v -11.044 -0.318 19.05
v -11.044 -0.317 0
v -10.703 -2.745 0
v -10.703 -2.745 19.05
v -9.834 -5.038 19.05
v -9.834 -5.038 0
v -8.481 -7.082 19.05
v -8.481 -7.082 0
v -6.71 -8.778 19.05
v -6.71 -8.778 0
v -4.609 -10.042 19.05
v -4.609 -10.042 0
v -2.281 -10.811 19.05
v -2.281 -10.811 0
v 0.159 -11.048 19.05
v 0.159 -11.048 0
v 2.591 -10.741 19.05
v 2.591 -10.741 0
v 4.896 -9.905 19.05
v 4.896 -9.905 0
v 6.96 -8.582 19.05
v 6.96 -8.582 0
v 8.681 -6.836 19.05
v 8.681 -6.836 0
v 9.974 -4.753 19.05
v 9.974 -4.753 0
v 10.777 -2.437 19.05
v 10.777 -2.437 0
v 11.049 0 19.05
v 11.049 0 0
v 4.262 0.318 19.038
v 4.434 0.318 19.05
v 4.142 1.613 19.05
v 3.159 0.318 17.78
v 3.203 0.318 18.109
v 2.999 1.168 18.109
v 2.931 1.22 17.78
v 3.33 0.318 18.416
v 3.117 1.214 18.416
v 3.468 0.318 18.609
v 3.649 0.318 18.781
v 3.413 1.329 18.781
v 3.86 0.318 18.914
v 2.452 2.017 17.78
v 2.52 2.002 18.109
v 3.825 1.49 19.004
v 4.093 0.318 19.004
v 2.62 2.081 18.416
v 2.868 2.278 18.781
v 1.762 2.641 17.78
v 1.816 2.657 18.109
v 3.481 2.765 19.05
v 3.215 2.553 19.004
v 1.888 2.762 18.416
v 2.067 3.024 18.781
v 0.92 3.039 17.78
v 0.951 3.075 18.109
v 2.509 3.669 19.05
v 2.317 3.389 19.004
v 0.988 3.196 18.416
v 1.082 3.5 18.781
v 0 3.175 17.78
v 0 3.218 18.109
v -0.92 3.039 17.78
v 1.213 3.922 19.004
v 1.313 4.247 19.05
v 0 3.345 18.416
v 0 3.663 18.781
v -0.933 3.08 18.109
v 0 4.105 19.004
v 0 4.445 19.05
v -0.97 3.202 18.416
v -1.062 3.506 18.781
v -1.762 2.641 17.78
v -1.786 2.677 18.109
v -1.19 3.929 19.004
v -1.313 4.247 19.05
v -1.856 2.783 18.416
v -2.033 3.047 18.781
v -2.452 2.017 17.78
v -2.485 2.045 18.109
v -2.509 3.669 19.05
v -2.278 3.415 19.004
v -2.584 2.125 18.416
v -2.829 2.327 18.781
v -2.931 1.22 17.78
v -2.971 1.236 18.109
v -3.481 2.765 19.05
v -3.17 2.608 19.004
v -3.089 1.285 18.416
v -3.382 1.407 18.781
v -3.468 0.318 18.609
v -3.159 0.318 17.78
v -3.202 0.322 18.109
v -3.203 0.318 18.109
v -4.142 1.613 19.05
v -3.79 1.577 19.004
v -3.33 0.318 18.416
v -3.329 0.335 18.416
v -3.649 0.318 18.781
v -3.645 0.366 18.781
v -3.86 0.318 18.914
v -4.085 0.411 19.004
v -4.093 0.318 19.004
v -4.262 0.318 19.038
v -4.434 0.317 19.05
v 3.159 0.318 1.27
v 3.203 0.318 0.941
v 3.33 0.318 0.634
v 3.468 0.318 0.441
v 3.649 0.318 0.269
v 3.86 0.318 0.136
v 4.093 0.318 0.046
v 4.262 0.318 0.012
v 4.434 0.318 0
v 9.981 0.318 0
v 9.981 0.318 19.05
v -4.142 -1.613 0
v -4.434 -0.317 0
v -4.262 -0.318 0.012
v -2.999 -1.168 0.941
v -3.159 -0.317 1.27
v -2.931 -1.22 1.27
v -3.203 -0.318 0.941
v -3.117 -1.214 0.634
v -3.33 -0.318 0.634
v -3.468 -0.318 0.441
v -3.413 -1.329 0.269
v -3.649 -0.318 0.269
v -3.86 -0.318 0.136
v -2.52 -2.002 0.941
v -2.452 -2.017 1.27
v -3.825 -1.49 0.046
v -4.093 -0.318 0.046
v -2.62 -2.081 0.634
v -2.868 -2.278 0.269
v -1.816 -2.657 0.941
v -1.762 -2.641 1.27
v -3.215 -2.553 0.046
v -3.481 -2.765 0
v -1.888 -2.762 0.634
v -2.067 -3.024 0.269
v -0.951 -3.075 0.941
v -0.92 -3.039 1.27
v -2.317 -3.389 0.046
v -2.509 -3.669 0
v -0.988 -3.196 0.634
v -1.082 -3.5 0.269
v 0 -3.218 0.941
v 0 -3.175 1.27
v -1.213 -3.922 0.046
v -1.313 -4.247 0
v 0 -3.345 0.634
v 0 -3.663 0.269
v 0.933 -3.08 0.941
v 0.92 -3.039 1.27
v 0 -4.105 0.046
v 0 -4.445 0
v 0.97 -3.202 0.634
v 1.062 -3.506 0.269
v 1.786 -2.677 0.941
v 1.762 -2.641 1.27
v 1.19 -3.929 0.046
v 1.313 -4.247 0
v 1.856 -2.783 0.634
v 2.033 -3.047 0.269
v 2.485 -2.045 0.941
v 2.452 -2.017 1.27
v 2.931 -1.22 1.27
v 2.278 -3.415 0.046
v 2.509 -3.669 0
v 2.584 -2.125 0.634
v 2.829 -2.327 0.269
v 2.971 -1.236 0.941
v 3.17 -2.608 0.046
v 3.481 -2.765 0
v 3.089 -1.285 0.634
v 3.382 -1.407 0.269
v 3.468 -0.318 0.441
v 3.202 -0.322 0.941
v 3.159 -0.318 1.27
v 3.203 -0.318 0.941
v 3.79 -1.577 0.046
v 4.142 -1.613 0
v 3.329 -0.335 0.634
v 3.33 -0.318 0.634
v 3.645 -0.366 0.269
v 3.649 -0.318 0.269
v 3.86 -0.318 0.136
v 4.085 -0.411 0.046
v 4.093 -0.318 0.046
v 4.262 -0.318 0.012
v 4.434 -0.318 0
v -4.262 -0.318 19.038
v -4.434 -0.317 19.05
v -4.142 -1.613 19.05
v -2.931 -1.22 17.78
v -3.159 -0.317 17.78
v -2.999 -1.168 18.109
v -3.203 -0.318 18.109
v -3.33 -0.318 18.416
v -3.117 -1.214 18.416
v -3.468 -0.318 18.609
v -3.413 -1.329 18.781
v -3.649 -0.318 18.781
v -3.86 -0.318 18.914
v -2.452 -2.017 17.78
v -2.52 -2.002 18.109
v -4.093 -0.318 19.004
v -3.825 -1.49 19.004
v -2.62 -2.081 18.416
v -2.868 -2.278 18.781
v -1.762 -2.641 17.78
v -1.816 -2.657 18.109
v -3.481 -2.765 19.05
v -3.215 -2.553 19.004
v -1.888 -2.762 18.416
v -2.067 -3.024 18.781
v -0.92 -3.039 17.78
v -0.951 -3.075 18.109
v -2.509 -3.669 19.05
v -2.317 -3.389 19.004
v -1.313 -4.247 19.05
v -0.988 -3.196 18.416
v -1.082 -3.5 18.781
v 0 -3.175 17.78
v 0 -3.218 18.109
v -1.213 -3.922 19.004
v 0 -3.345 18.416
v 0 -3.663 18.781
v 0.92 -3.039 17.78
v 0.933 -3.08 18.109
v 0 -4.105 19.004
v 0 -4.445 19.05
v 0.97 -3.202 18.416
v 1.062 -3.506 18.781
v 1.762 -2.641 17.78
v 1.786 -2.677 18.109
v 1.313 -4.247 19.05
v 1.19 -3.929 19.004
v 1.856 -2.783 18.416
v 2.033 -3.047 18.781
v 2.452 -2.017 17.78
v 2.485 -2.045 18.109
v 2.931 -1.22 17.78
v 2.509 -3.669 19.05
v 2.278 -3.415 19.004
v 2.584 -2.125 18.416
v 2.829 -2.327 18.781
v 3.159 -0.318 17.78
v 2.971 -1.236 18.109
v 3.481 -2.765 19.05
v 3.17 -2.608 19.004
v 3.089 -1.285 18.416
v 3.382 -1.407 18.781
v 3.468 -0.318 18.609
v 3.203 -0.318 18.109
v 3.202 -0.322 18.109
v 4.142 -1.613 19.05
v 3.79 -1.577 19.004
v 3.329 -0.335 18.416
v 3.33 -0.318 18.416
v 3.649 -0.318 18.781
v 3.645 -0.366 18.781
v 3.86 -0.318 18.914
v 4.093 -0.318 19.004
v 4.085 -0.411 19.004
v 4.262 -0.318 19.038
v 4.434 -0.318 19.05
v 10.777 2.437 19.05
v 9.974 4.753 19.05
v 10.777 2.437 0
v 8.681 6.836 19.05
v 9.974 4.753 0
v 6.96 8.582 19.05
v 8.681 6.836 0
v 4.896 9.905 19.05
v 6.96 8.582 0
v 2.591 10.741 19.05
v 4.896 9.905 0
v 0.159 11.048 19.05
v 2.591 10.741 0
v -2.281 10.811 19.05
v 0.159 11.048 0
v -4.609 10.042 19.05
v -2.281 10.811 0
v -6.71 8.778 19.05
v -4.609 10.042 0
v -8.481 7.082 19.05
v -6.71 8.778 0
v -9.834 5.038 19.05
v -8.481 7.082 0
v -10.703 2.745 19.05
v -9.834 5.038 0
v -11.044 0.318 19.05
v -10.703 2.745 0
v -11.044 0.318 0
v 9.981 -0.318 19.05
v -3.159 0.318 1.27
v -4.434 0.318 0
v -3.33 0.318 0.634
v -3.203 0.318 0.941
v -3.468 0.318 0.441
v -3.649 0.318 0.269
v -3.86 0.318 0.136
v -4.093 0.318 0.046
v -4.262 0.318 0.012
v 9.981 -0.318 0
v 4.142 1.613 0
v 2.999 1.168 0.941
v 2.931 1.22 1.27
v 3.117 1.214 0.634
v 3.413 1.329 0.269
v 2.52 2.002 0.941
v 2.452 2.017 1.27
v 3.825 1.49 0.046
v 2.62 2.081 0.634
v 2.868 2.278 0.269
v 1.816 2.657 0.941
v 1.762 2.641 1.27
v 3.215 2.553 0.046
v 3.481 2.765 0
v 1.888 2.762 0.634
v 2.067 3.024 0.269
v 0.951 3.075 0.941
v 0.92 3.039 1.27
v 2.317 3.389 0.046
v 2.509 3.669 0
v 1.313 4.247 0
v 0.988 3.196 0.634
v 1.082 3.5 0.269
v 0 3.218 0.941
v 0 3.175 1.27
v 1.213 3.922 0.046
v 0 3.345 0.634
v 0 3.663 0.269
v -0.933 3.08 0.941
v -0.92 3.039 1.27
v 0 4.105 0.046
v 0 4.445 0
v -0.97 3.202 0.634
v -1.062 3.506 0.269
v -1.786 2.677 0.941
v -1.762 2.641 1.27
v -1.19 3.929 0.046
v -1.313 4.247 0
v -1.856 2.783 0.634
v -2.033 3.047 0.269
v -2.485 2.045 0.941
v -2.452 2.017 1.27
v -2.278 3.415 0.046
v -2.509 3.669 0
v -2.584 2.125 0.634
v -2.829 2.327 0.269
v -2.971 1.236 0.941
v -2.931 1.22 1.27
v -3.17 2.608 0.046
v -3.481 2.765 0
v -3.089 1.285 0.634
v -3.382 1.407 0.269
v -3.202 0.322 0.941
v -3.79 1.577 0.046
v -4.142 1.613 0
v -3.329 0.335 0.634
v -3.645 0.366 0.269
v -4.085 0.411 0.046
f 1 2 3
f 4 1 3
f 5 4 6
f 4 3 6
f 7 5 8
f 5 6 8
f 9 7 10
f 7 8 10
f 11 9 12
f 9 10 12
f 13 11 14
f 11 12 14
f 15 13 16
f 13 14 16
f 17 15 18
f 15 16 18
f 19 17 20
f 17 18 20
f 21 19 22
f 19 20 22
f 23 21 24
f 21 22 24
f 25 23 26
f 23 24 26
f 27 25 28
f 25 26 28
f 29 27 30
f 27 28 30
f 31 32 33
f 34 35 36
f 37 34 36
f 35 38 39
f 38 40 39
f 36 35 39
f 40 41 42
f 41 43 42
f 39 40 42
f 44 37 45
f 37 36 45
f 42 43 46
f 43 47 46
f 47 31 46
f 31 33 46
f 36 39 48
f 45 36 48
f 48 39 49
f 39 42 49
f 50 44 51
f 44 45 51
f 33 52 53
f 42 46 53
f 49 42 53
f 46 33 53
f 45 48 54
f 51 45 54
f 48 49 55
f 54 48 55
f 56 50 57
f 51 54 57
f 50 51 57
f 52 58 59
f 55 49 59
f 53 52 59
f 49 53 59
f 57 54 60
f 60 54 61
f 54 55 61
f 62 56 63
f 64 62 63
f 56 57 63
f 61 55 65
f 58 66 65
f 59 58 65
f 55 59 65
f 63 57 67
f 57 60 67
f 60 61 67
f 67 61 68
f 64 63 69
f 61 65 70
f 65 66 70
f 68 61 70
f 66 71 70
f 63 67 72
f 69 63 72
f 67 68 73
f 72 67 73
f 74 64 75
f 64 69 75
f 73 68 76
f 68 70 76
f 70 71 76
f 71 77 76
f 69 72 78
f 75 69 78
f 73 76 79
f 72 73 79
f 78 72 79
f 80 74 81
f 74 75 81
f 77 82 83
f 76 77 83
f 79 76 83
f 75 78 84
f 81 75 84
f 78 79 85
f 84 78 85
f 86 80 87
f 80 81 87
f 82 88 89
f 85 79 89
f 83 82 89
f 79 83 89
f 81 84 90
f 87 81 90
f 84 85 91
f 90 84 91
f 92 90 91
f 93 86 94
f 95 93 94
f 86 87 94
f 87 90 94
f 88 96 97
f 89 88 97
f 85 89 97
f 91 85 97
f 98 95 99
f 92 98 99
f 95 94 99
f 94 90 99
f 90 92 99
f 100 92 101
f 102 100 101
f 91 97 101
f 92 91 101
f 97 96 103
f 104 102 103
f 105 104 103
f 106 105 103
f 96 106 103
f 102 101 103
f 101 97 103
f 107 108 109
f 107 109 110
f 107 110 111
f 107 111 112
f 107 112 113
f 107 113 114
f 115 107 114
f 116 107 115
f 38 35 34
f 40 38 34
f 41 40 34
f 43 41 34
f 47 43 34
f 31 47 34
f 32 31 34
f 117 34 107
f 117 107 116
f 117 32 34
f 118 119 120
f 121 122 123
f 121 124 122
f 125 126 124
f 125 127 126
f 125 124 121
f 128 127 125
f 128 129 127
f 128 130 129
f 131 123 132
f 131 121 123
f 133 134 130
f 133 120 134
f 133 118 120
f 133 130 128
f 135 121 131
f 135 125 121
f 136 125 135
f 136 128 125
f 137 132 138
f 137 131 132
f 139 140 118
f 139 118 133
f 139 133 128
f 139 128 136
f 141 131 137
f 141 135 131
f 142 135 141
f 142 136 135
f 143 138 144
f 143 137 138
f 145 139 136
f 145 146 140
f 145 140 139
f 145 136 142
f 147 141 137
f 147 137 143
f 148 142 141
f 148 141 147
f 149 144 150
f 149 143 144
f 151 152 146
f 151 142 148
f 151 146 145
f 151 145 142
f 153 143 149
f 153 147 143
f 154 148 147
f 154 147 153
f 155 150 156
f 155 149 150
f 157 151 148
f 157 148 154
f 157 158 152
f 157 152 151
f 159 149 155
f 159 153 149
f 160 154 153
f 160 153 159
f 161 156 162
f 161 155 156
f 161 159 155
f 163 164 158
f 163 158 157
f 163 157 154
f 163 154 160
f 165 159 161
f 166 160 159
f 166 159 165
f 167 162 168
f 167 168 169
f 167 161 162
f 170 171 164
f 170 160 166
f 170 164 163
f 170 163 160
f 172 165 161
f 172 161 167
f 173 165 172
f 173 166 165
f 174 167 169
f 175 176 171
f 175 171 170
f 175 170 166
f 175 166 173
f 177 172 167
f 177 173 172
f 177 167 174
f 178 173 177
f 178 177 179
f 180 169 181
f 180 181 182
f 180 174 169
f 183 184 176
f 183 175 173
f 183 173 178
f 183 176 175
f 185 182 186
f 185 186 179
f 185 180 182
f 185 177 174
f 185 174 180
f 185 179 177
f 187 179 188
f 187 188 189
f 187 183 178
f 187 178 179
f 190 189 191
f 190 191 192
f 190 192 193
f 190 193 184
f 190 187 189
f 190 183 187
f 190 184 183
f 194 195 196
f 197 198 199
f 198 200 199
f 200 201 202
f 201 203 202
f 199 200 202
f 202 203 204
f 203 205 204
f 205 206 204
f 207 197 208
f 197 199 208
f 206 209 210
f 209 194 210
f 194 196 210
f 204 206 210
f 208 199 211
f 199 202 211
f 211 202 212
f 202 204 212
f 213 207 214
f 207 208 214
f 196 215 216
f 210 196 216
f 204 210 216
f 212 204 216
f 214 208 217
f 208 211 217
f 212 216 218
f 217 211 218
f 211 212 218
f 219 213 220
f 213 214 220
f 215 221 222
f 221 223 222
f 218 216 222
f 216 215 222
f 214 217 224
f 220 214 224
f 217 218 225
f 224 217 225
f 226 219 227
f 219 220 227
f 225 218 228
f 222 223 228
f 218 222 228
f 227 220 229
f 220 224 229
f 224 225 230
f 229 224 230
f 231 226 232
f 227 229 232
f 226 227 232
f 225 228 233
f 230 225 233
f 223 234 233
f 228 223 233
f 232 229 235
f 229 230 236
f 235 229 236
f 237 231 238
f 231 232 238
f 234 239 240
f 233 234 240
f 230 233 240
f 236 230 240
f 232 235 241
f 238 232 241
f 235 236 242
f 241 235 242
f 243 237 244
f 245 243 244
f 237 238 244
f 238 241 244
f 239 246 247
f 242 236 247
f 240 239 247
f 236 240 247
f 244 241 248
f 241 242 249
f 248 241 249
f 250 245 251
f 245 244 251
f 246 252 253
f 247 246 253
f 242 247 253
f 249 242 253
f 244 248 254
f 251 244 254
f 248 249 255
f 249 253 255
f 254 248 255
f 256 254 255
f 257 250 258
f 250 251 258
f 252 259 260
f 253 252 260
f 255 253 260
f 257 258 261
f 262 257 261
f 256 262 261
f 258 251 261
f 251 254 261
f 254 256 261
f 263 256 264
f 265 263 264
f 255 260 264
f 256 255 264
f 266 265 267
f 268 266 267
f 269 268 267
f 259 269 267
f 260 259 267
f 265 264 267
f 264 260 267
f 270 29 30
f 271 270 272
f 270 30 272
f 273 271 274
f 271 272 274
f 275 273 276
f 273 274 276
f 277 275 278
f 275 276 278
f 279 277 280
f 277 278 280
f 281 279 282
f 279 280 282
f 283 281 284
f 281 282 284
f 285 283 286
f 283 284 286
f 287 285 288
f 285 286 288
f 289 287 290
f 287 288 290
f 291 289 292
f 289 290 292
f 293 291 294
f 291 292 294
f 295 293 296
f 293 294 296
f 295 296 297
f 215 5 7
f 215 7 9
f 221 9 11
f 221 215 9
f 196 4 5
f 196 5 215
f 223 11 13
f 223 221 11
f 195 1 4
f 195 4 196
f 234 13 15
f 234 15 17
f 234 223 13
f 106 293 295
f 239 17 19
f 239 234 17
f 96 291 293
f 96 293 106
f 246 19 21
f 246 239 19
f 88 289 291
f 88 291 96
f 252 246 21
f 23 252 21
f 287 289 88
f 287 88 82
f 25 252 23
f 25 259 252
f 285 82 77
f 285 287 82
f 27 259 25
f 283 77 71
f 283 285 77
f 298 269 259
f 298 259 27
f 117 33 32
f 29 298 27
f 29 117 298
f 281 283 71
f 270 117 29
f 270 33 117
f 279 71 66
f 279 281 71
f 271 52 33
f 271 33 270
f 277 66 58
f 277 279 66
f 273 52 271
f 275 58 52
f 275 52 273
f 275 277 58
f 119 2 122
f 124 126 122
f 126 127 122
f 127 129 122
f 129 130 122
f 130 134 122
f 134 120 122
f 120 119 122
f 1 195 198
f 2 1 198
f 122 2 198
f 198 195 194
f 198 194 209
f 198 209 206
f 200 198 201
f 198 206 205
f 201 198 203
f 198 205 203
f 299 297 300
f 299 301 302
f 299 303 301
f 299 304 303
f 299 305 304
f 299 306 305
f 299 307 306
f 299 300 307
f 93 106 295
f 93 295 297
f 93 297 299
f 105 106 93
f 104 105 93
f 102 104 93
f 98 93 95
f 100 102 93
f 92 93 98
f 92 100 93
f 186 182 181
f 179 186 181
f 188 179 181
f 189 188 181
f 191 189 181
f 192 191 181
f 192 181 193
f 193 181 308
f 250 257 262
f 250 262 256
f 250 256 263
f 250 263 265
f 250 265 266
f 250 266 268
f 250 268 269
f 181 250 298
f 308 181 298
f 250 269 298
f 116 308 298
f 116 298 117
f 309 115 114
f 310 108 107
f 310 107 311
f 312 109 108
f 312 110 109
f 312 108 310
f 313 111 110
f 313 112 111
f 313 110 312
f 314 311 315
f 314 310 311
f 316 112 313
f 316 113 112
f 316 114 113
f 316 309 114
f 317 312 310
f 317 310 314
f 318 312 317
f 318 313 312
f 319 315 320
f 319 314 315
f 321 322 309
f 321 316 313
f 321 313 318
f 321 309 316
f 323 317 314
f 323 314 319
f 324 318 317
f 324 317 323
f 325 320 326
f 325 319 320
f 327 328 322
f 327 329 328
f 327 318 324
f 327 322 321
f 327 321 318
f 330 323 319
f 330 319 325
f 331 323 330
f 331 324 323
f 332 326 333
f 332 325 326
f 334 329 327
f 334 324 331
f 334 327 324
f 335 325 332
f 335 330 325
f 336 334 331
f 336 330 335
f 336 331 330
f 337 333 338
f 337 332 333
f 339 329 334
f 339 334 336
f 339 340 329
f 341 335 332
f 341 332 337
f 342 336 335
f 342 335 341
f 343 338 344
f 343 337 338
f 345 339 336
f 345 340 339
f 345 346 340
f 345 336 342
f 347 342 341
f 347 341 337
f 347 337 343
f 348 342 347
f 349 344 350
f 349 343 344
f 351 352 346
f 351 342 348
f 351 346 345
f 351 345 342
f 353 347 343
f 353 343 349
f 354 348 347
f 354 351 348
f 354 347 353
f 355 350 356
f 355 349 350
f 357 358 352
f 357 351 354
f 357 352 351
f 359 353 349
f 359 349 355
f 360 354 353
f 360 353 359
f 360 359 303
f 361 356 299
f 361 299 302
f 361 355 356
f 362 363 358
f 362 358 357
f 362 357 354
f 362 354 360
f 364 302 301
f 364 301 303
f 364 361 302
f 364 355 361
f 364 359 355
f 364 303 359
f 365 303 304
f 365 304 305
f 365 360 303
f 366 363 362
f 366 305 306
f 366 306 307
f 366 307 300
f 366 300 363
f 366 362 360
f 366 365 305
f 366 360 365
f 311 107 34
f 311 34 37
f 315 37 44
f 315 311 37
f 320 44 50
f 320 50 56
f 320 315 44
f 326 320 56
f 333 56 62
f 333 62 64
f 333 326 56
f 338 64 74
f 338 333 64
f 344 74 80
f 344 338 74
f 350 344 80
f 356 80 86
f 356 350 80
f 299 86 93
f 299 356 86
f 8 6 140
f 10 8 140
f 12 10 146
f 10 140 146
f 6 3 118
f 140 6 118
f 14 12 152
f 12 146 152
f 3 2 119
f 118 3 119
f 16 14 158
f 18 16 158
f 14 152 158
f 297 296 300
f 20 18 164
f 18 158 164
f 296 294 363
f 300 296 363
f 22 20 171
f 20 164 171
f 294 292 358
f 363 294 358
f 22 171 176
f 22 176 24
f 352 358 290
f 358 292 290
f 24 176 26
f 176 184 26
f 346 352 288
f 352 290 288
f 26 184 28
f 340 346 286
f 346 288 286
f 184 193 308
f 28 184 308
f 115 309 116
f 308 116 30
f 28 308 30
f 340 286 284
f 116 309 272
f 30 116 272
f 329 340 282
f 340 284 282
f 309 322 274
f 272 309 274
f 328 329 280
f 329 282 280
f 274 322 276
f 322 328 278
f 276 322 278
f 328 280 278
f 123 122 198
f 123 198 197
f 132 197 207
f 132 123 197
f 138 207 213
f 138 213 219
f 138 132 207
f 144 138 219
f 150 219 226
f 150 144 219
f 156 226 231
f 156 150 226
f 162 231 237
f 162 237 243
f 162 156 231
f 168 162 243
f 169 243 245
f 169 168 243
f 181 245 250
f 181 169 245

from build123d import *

# Parameters (mm, degrees)
SKETCH1_R           = 11.049
SKETCH1_R_2         = 3.175
BOSS_EXTRUDE1_DEPTH = 19.05
FILLET1_R           = 1.27
SKETCH3_W           = 21.529859436
SKETCH3_H           = 0.635
CUT_EXTRUDE1_DEPTH  = 20.05


with BuildPart() as part:
    # Sketch1 → Boss-Extrude1 (new body)
    with BuildSketch(Plane.XY):
        Circle(SKETCH1_R)
        Circle(SKETCH1_R_2, mode=Mode.SUBTRACT)
    extrude(amount=BOSS_EXTRUDE1_DEPTH)

    # Fillet1
    fillet1_edges = [part.edges().sort_by_distance(p)[0] for p in [
        (-3.175, 0, 0),
        (-3.175, 0, 19.05),
    ]]
    fillet(fillet1_edges, radius=FILLET1_R)

    # Sketch3 → Cut-Extrude1 (cut, through all)
    with BuildSketch(Plane.XY.offset(19.05)):
        with Locations((-0.784069021, 0)):
            Rectangle(SKETCH3_W, SKETCH3_H)
    extrude(amount=-CUT_EXTRUDE1_DEPTH, mode=Mode.SUBTRACT)


solid = part.part
